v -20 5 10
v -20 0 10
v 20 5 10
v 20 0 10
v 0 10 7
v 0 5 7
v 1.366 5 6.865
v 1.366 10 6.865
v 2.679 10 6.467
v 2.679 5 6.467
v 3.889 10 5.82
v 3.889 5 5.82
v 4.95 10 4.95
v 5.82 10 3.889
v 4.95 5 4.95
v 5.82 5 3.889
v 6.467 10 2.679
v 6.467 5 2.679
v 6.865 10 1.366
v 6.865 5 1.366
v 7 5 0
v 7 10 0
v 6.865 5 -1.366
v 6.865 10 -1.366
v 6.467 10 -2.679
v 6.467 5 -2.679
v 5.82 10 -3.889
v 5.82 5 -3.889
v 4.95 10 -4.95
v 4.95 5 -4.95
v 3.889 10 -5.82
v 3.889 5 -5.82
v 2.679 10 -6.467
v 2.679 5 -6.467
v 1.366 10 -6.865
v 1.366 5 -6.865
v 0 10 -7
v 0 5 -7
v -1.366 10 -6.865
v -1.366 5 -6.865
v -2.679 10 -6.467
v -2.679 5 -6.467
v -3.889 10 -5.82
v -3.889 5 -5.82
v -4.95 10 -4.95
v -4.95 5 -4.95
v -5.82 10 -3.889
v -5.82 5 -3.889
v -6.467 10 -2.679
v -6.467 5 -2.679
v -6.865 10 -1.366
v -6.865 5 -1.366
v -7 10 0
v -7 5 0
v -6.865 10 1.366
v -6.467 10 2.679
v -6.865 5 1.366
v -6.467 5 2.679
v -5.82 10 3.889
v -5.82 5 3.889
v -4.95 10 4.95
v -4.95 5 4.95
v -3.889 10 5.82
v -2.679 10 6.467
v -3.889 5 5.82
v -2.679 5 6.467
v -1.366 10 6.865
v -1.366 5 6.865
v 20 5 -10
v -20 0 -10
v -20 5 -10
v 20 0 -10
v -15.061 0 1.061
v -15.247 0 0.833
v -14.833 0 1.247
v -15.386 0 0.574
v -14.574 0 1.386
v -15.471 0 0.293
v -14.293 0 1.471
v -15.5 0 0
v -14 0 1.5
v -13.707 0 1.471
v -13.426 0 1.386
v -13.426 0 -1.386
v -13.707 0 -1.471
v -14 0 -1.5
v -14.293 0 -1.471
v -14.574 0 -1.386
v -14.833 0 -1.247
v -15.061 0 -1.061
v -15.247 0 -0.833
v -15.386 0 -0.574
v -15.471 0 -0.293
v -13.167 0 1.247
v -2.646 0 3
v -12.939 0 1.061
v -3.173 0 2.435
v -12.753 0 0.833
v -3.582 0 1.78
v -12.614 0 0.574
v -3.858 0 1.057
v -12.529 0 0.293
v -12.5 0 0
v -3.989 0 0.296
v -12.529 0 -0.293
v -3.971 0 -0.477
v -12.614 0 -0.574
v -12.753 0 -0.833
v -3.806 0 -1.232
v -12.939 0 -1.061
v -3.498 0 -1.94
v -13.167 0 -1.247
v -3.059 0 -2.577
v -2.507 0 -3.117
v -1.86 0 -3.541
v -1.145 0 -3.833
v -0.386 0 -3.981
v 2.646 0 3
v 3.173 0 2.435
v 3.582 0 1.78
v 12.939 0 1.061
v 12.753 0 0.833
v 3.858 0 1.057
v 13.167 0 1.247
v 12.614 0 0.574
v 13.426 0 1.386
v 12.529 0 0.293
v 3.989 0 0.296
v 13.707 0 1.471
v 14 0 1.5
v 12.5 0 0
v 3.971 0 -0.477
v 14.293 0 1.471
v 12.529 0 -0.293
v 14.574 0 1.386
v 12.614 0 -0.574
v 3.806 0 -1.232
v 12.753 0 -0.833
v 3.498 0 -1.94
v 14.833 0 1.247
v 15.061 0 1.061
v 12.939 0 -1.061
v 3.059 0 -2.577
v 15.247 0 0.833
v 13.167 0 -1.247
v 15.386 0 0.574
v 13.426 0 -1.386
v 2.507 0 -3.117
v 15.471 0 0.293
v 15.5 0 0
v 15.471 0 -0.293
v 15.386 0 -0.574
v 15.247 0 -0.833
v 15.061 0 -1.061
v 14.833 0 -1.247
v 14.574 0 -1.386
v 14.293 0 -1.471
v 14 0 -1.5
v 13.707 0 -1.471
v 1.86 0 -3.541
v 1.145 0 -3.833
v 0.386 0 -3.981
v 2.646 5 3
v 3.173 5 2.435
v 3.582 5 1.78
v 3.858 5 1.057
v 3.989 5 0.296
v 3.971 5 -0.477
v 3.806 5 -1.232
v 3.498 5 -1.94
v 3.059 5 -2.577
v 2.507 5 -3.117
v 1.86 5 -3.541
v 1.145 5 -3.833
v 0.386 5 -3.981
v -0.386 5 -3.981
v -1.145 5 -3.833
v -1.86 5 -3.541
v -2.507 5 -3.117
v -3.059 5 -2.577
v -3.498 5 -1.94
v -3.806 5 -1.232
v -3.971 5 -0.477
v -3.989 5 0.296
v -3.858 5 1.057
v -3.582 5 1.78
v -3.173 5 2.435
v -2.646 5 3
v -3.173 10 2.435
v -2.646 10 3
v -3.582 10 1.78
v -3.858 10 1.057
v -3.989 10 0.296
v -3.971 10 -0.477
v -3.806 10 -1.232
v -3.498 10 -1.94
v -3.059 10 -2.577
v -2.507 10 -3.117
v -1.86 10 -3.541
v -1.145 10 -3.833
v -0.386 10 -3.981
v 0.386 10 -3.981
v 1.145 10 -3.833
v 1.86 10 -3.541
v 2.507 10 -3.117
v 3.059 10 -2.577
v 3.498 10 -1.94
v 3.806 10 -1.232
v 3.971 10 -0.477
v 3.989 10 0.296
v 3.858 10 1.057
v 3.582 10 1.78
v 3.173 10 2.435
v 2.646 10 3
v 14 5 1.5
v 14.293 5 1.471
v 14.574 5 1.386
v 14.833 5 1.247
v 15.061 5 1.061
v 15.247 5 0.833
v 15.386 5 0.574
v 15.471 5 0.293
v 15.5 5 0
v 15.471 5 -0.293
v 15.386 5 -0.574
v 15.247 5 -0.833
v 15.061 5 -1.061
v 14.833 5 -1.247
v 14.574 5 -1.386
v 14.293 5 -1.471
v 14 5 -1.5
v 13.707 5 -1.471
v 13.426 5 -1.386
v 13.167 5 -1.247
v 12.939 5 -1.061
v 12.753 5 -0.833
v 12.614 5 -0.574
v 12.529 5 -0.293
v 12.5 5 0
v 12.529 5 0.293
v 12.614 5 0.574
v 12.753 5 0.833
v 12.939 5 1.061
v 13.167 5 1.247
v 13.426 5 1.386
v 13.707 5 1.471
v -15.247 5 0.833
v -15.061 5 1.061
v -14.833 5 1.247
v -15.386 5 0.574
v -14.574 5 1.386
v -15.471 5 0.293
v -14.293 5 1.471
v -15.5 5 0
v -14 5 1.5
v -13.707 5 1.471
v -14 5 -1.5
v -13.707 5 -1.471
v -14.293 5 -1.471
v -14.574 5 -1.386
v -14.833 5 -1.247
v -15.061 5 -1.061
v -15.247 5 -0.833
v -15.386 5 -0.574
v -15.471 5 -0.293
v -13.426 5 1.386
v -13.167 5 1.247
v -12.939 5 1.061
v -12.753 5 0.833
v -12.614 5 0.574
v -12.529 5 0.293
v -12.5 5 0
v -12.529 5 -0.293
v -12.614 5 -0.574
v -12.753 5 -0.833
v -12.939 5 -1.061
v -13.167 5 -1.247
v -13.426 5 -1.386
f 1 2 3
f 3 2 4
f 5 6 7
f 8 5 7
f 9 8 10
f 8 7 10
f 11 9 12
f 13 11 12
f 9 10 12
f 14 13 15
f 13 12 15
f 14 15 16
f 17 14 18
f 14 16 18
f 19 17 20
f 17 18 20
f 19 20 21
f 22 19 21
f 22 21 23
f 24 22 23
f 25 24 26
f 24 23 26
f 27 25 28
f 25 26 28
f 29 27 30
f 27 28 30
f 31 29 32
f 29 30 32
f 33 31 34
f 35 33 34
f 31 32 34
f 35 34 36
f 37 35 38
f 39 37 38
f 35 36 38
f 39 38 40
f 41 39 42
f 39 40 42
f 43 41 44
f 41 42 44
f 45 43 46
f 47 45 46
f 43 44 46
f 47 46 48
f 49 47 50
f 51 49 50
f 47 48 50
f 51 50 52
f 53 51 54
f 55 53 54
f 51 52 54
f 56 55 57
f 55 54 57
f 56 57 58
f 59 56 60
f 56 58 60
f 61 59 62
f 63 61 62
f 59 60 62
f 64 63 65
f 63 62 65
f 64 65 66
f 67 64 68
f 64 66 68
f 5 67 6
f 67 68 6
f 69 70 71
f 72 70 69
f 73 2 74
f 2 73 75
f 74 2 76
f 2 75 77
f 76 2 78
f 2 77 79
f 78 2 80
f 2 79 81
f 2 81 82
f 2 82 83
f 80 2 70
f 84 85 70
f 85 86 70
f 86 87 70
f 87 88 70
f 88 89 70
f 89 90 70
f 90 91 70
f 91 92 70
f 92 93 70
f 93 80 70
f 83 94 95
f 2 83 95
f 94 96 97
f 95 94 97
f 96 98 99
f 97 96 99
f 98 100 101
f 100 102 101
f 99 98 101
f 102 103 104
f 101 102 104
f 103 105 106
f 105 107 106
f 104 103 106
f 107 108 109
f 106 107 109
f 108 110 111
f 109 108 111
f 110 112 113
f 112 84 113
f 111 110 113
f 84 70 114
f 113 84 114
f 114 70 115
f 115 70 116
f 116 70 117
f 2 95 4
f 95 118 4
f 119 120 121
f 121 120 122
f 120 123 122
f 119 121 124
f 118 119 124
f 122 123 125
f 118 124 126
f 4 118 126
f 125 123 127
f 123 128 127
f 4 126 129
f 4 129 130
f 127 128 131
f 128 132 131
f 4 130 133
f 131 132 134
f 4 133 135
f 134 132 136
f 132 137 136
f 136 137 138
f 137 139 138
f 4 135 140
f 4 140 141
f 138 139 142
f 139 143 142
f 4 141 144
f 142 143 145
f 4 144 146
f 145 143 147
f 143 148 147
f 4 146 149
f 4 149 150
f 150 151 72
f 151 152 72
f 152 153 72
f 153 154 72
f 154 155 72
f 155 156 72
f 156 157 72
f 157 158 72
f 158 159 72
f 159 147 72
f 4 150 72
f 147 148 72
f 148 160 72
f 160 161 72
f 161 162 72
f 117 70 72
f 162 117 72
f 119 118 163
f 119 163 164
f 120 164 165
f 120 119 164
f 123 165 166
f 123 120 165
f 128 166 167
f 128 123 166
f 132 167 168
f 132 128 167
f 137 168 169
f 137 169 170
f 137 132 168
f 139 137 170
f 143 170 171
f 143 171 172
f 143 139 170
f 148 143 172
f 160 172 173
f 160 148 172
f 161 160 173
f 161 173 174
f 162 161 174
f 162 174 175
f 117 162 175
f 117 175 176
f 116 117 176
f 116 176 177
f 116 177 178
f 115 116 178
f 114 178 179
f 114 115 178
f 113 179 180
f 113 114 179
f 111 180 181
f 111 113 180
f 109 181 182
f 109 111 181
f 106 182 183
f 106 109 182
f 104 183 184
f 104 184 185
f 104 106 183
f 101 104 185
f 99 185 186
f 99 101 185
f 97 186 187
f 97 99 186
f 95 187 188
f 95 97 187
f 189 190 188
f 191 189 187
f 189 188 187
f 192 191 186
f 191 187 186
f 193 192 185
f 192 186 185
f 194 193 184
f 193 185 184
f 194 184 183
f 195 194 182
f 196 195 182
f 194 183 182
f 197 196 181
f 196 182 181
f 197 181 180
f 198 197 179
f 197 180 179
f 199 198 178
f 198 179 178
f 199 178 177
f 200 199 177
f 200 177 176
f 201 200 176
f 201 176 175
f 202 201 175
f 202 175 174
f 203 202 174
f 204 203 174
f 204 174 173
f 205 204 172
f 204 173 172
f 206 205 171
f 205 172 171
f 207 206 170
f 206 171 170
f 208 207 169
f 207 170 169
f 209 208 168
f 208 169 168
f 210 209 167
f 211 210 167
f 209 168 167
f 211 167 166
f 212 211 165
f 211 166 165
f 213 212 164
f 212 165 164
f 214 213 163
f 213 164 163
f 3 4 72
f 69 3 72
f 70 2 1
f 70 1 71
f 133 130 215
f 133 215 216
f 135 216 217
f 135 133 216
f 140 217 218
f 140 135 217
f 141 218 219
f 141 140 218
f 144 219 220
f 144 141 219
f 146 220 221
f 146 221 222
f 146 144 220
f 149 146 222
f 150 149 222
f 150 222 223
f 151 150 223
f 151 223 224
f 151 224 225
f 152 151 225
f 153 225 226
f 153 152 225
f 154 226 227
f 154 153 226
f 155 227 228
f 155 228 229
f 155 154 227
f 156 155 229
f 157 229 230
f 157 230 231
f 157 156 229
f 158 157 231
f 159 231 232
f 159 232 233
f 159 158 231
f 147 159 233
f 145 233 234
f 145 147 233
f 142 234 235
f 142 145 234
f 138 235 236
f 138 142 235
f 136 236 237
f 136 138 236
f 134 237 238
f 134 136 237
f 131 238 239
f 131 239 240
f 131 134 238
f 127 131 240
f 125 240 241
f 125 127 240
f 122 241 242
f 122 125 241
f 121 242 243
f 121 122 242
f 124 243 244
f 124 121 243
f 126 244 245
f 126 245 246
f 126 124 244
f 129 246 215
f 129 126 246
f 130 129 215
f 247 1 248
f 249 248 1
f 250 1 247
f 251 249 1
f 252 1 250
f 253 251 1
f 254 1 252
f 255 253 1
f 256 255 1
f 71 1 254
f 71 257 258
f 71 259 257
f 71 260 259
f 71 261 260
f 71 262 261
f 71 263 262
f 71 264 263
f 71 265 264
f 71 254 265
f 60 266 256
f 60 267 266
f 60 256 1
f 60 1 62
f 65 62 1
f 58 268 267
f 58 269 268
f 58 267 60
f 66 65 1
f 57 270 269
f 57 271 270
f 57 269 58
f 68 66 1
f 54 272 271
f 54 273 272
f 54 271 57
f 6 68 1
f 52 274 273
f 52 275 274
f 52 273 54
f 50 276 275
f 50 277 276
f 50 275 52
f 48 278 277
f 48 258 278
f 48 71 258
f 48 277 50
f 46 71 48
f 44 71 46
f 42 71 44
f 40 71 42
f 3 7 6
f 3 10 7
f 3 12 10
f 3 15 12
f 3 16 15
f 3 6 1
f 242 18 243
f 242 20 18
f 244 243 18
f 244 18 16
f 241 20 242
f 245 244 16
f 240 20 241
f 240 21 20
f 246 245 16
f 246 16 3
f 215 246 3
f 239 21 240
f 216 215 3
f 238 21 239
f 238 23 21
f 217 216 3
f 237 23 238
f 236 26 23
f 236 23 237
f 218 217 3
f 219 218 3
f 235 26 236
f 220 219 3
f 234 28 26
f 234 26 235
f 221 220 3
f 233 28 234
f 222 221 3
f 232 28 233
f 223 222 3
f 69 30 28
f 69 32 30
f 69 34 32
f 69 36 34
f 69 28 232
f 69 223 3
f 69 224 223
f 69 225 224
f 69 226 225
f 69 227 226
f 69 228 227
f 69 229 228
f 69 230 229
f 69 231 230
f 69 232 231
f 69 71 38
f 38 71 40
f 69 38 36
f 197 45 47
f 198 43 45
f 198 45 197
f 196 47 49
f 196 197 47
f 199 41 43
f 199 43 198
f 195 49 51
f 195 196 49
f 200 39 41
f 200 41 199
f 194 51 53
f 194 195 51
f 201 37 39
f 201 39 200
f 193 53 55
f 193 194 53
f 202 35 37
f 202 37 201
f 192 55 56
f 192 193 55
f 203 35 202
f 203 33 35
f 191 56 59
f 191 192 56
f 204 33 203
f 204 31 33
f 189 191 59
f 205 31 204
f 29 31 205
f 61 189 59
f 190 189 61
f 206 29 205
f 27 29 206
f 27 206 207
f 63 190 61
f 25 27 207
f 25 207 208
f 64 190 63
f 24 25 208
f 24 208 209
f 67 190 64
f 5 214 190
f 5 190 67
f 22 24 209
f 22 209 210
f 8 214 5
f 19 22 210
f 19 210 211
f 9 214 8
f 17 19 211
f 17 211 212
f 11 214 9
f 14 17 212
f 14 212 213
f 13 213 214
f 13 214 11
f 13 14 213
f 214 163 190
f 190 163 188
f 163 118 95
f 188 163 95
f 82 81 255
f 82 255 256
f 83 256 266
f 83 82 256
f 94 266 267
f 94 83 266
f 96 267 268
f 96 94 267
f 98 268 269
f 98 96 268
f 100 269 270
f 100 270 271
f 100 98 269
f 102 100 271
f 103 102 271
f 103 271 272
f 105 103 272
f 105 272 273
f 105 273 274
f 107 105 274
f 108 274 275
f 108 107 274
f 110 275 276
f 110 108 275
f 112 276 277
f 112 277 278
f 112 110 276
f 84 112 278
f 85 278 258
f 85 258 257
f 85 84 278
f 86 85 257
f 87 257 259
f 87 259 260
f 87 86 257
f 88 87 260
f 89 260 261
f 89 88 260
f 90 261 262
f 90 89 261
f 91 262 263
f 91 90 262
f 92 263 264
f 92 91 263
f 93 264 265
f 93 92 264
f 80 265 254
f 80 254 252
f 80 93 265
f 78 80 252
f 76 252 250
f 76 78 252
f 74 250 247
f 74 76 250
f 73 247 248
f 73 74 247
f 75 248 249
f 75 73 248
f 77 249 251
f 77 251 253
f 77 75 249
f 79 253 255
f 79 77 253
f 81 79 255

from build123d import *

# Parameters (mm, degrees)
SKETCH1_W           = 40
SKETCH1_H           = 20
SKETCH1_R           = 1.5
BOSS_EXTRUDE1_DEPTH = 5
SKETCH2_R           = 7
BOSS_EXTRUDE2_DEPTH = 5


with BuildPart() as part:
    # Sketch1 → Boss-Extrude1 (new body)
    with BuildSketch(Plane(origin=(0, 0, 0), x_dir=(1, 0, 0), z_dir=(0, 1, 0))):
        Rectangle(SKETCH1_W, SKETCH1_H)
        with Locations(Location((14, 0, 0), (0, 0, 270))):
            Circle(SKETCH1_R, mode=Mode.SUBTRACT)
        with Locations(Location((-14, 0, 0), (0, 0, 270))):
            Circle(SKETCH1_R, mode=Mode.SUBTRACT)
        with BuildLine():
            Line((-2.645751311, -3), (2.645751311, -3))
            ThreePointArc((2.645751311, -3), (0, 4), (-2.645751311, -3))
        make_face(mode=Mode.SUBTRACT)
    extrude(amount=BOSS_EXTRUDE1_DEPTH)

    # Sketch2 → Boss-Extrude2 (add)
    with BuildSketch(Plane(origin=(0, 5, 0), x_dir=(1, 0, 0), z_dir=(0, 1, 0))):
        with Locations(Location((0, 0, 0), (0, 0, 270))):
            Circle(SKETCH2_R)
        with BuildLine():
            ThreePointArc((-2.645751311, -3), (0, 4), (2.645751311, -3))
            Line((2.645751311, -3), (-2.645751311, -3))
        make_face(mode=Mode.SUBTRACT)
    extrude(amount=BOSS_EXTRUDE2_DEPTH)


solid = part.part
